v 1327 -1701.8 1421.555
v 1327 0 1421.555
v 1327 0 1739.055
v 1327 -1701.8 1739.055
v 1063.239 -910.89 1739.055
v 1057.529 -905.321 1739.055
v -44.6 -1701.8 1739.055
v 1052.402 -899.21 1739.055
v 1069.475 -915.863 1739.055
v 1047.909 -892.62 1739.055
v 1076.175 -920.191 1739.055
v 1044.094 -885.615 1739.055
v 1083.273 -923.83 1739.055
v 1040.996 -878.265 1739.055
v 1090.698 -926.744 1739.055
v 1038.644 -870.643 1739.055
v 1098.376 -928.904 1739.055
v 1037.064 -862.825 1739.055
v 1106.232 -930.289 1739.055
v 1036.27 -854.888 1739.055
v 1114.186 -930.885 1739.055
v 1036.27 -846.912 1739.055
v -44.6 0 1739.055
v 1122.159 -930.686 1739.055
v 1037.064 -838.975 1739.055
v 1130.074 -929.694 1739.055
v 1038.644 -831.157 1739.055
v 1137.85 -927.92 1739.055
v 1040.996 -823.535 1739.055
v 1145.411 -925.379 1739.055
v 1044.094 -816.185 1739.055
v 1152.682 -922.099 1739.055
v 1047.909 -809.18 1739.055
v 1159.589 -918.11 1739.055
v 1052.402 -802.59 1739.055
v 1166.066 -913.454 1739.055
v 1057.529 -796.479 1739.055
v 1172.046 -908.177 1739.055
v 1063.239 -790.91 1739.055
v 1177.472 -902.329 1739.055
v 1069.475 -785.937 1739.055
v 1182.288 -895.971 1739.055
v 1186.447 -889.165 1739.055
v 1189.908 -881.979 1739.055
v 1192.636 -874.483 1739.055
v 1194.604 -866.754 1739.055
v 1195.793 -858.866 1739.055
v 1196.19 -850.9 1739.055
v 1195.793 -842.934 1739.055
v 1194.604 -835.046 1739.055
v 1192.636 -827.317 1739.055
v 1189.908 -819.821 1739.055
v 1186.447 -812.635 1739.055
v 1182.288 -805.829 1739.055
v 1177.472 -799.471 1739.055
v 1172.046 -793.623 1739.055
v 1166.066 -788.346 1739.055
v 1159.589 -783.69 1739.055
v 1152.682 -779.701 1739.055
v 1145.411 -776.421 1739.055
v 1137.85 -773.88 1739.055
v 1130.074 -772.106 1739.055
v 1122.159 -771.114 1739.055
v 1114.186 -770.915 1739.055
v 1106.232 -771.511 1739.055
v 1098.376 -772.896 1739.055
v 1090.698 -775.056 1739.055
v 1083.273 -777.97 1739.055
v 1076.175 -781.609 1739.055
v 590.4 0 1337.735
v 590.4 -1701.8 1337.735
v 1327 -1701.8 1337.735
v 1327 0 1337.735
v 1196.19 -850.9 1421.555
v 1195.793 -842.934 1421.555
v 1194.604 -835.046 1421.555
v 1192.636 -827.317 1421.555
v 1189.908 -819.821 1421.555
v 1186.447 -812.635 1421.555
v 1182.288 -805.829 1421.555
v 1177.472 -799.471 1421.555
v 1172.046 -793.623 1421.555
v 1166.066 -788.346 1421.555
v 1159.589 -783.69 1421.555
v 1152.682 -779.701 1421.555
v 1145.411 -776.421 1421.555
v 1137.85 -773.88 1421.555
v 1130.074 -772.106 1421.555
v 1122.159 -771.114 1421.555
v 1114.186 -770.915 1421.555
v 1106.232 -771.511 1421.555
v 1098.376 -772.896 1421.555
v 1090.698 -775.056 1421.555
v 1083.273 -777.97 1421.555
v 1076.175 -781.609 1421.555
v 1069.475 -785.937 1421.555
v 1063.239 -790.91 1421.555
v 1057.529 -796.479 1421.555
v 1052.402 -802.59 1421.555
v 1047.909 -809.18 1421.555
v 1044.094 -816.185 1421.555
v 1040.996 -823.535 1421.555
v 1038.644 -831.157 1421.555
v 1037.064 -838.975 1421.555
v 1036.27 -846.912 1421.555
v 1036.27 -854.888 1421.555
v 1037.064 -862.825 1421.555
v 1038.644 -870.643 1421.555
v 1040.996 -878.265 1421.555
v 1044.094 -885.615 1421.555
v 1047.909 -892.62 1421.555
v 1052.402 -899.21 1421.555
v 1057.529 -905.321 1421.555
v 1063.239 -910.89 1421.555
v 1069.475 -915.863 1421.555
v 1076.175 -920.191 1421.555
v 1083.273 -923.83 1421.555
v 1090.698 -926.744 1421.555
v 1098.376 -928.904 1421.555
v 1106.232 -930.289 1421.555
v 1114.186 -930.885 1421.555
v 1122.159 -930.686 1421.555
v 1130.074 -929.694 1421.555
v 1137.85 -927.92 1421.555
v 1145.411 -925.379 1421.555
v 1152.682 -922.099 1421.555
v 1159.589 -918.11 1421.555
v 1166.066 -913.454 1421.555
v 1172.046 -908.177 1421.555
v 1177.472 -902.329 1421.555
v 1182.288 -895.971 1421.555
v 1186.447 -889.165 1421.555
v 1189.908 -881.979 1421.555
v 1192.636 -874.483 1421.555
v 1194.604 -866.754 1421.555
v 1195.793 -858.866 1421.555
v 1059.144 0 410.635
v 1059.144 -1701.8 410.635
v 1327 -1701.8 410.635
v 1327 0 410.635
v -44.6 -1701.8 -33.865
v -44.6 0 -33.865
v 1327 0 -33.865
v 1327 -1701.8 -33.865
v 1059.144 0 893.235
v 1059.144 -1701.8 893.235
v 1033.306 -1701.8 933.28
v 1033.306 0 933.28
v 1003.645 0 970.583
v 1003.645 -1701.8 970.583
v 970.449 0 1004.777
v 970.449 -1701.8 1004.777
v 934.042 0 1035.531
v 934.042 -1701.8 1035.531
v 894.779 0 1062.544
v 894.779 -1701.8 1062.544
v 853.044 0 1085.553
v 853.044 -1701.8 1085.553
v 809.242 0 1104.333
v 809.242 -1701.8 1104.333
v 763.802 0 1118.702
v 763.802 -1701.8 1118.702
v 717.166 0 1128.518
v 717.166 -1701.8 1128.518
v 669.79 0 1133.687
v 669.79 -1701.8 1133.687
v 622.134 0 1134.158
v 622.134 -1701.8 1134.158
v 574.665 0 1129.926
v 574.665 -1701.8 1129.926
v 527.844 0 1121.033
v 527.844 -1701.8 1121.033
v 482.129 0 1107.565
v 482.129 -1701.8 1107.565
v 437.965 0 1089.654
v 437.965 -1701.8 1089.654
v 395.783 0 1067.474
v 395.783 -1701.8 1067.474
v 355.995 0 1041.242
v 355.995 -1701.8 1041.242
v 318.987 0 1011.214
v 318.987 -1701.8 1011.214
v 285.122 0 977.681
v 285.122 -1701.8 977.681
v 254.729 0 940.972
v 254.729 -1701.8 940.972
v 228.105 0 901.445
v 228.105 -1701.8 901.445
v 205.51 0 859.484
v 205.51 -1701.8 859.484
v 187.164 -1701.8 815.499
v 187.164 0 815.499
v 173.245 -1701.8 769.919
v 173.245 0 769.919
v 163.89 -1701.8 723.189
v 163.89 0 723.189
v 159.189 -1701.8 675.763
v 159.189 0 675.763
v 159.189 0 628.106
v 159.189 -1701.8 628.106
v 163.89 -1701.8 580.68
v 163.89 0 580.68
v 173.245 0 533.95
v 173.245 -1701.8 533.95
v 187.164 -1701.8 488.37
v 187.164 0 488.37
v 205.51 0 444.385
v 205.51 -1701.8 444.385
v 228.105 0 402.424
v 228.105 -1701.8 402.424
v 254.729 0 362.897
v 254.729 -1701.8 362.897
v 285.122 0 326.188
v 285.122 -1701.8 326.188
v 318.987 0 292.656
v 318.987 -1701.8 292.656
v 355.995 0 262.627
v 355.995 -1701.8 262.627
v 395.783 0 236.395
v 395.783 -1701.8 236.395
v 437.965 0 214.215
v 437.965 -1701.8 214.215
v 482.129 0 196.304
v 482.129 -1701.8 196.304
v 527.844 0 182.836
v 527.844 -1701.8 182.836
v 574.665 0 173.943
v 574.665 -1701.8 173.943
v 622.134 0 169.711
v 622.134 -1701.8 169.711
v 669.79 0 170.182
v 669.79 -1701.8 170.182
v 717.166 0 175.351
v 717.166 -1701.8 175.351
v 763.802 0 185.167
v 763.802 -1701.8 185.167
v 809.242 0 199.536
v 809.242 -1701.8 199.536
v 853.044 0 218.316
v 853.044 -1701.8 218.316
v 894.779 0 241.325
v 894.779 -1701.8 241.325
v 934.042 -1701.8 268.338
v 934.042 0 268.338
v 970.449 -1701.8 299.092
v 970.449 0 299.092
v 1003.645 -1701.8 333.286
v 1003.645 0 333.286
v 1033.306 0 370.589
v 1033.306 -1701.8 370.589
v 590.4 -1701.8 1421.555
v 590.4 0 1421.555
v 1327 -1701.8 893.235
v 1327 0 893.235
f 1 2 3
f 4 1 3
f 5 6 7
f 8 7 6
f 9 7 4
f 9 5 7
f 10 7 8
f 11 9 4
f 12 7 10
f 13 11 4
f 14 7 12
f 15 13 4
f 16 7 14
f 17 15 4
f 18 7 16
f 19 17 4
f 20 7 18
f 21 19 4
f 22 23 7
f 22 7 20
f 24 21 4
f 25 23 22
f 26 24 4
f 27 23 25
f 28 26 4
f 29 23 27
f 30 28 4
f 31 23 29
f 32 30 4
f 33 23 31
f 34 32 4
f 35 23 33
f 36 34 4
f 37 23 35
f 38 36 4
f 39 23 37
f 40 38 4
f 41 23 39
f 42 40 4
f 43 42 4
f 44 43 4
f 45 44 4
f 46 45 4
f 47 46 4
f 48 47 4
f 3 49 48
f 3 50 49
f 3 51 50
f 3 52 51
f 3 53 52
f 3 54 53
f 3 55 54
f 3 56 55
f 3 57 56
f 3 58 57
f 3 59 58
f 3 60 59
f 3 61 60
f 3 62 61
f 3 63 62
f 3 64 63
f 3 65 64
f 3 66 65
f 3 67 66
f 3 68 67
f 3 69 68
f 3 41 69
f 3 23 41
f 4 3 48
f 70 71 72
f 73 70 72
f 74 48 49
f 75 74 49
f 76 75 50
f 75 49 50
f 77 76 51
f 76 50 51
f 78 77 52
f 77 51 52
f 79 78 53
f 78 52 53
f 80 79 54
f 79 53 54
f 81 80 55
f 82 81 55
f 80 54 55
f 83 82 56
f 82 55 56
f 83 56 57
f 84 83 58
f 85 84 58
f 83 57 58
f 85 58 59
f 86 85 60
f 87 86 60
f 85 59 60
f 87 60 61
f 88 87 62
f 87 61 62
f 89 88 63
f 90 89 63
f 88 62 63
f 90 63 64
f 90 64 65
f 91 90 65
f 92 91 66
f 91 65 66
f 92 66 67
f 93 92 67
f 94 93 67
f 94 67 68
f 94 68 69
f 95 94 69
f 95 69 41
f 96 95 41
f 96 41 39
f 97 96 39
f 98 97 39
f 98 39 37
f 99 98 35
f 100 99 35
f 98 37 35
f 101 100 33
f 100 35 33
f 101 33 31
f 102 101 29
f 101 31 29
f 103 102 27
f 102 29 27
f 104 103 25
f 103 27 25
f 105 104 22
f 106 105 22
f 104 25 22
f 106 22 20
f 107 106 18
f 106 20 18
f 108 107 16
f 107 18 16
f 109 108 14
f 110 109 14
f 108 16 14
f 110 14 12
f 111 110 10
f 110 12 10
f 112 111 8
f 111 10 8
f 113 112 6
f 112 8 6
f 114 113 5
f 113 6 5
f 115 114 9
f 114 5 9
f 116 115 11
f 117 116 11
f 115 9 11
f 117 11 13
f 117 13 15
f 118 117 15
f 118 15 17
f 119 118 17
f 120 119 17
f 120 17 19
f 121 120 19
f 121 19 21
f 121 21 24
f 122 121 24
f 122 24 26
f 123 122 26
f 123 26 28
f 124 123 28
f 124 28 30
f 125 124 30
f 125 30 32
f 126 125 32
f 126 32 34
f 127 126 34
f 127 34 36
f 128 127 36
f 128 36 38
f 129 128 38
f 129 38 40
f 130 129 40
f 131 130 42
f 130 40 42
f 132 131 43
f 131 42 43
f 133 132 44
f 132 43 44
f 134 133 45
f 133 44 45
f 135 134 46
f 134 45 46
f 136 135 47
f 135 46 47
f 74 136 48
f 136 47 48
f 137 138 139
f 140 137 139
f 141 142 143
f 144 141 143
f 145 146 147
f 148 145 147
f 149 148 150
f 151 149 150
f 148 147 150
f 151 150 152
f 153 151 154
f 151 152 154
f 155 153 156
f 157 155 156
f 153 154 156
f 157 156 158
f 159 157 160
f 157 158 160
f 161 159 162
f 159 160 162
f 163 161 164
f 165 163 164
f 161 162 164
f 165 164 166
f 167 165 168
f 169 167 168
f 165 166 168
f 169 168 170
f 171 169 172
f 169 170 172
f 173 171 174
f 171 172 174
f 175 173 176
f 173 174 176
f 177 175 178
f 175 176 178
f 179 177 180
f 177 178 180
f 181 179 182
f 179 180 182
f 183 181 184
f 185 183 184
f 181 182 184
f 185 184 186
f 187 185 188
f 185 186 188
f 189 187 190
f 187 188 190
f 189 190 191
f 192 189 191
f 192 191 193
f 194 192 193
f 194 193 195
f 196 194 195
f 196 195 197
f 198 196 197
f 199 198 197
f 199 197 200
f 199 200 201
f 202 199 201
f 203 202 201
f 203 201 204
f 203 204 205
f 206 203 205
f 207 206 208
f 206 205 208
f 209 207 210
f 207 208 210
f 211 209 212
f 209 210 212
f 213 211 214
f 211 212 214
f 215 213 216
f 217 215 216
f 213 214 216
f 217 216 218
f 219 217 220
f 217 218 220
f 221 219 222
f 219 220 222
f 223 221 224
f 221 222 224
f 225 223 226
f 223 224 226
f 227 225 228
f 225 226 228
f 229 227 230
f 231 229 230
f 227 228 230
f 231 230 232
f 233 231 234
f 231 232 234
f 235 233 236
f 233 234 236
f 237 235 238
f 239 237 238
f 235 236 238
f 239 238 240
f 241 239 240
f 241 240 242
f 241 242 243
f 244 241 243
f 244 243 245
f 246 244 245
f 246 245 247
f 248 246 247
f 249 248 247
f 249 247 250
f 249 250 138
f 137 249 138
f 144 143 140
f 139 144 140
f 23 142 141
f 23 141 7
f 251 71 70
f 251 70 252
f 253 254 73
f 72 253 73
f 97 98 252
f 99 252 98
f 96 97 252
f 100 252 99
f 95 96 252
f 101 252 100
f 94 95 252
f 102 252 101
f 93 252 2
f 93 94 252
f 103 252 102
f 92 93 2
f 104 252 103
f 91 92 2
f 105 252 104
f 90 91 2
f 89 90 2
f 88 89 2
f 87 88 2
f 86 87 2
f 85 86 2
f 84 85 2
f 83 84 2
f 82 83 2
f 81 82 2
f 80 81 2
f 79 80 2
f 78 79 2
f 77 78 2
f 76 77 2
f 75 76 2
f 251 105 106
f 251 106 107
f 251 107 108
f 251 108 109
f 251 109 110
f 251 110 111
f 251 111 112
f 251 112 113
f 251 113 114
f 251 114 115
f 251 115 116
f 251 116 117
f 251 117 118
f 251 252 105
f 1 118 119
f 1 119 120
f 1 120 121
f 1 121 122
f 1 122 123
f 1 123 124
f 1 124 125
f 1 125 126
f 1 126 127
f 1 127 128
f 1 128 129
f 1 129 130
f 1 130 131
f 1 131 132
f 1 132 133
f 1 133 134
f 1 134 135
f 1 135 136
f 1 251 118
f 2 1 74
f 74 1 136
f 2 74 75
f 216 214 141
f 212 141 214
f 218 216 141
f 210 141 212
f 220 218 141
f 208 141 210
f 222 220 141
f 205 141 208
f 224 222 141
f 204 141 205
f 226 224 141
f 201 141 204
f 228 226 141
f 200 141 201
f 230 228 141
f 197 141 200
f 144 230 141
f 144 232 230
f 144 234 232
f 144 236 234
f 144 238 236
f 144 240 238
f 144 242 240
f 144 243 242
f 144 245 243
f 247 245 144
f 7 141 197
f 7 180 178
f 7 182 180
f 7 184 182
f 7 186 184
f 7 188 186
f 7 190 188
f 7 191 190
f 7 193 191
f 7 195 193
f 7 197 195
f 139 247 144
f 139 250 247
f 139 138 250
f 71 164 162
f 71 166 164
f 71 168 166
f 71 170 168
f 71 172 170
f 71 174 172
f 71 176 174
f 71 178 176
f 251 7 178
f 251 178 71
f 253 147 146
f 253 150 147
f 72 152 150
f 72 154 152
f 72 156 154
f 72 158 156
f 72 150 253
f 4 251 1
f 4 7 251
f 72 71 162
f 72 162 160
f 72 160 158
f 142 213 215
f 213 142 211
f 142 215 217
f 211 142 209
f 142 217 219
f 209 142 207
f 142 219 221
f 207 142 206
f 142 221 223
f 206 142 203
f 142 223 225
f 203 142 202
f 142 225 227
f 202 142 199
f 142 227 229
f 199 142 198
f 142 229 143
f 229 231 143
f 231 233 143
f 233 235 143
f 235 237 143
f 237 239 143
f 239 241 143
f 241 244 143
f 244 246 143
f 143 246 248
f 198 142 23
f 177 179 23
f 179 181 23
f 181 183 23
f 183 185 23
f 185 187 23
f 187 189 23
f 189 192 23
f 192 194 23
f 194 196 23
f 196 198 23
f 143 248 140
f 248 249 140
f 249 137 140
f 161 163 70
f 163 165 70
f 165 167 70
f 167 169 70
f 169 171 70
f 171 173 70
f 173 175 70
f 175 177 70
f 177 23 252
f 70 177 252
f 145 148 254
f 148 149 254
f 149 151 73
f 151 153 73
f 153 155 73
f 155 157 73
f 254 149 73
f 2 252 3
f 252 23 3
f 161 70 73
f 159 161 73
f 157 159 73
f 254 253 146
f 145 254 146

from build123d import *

# Parameters (mm, degrees)
F0_W     = 1371.6
F0_H     = 1772.92
F2_DEPTH = 1701.8
F3_W     = 736.6
F3_H     = 83.82
F4_DEPTH = 1701.8
F6_DEPTH = 1701.8
F7_R     = 80.01
F8_DEPTH = 317.5


with BuildPart() as f2:
    # F0 (on Front) → F2 (new body)
    with BuildSketch(Plane.XZ):
        with Locations((641.200314182, 852.594570539)):
            Rectangle(F0_W, F0_H)
    extrude(amount=F2_DEPTH)

    # F3 (on face) → F4 (cut)
    with BuildSketch(Plane.XZ.offset(1701.8)):
        with Locations((958.700314182, 1379.644570539)):
            Rectangle(F3_W, F3_H)
    extrude(amount=-F4_DEPTH, mode=Mode.SUBTRACT)

    # F5 (on face) → F6 (cut)
    with BuildSketch(Plane.XZ.offset(1701.8)):
        with BuildLine():
            ThreePointArc((1059.1441740484, 410.634570539), (1107.3561179491, 527.0284993725), (1123.800314182, 651.934570539))
            ThreePointArc((1123.800314182, 651.934570539), (1107.3561179491, 776.8406417055), (1059.1441740484, 893.234570539))
            Line((1059.1441740484, 893.234570539), (692.000314182, 893.234570539))
            Line((692.000314182, 893.234570539), (692.000314182, 410.634570539))
            Line((692.000314182, 410.634570539), (1059.1441740484, 410.634570539))
        make_face()
        with BuildLine():
            ThreePointArc((1059.1441740484, 893.234570539), (1107.3561179491, 776.8406417055), (1123.800314182, 651.934570539))
            ThreePointArc((1123.800314182, 651.934570539), (1107.3561179491, 527.0284993725), (1059.1441740484, 410.634570539))
            Line((1059.1441740484, 410.634570539), (1327.000314182, 410.634570539))
            Line((1327.000314182, 410.634570539), (1327.000314182, 893.234570539))
            Line((1327.000314182, 893.234570539), (1059.1441740484, 893.234570539))
        make_face()
        with BuildLine():
            Line((692.000314182, 893.234570539), (1059.1441740484, 893.234570539))
            ThreePointArc((1059.1441740484, 893.234570539), (158.600314182, 651.934570539), (1059.1441740484, 410.634570539))
            Line((1059.1441740484, 410.634570539), (692.000314182, 410.634570539))
            Line((692.000314182, 410.634570539), (692.000314182, 893.234570539))
        make_face()
    extrude(amount=-F6_DEPTH, mode=Mode.SUBTRACT)

    # F7 (on face) → F8 (cut)
    with BuildSketch(Plane.XY.offset(1739.054570539)):
        with Locations((1116.180314182, -850.9)):
            Circle(F7_R)
    extrude(amount=-F8_DEPTH, mode=Mode.SUBTRACT)


solid = f2.part
